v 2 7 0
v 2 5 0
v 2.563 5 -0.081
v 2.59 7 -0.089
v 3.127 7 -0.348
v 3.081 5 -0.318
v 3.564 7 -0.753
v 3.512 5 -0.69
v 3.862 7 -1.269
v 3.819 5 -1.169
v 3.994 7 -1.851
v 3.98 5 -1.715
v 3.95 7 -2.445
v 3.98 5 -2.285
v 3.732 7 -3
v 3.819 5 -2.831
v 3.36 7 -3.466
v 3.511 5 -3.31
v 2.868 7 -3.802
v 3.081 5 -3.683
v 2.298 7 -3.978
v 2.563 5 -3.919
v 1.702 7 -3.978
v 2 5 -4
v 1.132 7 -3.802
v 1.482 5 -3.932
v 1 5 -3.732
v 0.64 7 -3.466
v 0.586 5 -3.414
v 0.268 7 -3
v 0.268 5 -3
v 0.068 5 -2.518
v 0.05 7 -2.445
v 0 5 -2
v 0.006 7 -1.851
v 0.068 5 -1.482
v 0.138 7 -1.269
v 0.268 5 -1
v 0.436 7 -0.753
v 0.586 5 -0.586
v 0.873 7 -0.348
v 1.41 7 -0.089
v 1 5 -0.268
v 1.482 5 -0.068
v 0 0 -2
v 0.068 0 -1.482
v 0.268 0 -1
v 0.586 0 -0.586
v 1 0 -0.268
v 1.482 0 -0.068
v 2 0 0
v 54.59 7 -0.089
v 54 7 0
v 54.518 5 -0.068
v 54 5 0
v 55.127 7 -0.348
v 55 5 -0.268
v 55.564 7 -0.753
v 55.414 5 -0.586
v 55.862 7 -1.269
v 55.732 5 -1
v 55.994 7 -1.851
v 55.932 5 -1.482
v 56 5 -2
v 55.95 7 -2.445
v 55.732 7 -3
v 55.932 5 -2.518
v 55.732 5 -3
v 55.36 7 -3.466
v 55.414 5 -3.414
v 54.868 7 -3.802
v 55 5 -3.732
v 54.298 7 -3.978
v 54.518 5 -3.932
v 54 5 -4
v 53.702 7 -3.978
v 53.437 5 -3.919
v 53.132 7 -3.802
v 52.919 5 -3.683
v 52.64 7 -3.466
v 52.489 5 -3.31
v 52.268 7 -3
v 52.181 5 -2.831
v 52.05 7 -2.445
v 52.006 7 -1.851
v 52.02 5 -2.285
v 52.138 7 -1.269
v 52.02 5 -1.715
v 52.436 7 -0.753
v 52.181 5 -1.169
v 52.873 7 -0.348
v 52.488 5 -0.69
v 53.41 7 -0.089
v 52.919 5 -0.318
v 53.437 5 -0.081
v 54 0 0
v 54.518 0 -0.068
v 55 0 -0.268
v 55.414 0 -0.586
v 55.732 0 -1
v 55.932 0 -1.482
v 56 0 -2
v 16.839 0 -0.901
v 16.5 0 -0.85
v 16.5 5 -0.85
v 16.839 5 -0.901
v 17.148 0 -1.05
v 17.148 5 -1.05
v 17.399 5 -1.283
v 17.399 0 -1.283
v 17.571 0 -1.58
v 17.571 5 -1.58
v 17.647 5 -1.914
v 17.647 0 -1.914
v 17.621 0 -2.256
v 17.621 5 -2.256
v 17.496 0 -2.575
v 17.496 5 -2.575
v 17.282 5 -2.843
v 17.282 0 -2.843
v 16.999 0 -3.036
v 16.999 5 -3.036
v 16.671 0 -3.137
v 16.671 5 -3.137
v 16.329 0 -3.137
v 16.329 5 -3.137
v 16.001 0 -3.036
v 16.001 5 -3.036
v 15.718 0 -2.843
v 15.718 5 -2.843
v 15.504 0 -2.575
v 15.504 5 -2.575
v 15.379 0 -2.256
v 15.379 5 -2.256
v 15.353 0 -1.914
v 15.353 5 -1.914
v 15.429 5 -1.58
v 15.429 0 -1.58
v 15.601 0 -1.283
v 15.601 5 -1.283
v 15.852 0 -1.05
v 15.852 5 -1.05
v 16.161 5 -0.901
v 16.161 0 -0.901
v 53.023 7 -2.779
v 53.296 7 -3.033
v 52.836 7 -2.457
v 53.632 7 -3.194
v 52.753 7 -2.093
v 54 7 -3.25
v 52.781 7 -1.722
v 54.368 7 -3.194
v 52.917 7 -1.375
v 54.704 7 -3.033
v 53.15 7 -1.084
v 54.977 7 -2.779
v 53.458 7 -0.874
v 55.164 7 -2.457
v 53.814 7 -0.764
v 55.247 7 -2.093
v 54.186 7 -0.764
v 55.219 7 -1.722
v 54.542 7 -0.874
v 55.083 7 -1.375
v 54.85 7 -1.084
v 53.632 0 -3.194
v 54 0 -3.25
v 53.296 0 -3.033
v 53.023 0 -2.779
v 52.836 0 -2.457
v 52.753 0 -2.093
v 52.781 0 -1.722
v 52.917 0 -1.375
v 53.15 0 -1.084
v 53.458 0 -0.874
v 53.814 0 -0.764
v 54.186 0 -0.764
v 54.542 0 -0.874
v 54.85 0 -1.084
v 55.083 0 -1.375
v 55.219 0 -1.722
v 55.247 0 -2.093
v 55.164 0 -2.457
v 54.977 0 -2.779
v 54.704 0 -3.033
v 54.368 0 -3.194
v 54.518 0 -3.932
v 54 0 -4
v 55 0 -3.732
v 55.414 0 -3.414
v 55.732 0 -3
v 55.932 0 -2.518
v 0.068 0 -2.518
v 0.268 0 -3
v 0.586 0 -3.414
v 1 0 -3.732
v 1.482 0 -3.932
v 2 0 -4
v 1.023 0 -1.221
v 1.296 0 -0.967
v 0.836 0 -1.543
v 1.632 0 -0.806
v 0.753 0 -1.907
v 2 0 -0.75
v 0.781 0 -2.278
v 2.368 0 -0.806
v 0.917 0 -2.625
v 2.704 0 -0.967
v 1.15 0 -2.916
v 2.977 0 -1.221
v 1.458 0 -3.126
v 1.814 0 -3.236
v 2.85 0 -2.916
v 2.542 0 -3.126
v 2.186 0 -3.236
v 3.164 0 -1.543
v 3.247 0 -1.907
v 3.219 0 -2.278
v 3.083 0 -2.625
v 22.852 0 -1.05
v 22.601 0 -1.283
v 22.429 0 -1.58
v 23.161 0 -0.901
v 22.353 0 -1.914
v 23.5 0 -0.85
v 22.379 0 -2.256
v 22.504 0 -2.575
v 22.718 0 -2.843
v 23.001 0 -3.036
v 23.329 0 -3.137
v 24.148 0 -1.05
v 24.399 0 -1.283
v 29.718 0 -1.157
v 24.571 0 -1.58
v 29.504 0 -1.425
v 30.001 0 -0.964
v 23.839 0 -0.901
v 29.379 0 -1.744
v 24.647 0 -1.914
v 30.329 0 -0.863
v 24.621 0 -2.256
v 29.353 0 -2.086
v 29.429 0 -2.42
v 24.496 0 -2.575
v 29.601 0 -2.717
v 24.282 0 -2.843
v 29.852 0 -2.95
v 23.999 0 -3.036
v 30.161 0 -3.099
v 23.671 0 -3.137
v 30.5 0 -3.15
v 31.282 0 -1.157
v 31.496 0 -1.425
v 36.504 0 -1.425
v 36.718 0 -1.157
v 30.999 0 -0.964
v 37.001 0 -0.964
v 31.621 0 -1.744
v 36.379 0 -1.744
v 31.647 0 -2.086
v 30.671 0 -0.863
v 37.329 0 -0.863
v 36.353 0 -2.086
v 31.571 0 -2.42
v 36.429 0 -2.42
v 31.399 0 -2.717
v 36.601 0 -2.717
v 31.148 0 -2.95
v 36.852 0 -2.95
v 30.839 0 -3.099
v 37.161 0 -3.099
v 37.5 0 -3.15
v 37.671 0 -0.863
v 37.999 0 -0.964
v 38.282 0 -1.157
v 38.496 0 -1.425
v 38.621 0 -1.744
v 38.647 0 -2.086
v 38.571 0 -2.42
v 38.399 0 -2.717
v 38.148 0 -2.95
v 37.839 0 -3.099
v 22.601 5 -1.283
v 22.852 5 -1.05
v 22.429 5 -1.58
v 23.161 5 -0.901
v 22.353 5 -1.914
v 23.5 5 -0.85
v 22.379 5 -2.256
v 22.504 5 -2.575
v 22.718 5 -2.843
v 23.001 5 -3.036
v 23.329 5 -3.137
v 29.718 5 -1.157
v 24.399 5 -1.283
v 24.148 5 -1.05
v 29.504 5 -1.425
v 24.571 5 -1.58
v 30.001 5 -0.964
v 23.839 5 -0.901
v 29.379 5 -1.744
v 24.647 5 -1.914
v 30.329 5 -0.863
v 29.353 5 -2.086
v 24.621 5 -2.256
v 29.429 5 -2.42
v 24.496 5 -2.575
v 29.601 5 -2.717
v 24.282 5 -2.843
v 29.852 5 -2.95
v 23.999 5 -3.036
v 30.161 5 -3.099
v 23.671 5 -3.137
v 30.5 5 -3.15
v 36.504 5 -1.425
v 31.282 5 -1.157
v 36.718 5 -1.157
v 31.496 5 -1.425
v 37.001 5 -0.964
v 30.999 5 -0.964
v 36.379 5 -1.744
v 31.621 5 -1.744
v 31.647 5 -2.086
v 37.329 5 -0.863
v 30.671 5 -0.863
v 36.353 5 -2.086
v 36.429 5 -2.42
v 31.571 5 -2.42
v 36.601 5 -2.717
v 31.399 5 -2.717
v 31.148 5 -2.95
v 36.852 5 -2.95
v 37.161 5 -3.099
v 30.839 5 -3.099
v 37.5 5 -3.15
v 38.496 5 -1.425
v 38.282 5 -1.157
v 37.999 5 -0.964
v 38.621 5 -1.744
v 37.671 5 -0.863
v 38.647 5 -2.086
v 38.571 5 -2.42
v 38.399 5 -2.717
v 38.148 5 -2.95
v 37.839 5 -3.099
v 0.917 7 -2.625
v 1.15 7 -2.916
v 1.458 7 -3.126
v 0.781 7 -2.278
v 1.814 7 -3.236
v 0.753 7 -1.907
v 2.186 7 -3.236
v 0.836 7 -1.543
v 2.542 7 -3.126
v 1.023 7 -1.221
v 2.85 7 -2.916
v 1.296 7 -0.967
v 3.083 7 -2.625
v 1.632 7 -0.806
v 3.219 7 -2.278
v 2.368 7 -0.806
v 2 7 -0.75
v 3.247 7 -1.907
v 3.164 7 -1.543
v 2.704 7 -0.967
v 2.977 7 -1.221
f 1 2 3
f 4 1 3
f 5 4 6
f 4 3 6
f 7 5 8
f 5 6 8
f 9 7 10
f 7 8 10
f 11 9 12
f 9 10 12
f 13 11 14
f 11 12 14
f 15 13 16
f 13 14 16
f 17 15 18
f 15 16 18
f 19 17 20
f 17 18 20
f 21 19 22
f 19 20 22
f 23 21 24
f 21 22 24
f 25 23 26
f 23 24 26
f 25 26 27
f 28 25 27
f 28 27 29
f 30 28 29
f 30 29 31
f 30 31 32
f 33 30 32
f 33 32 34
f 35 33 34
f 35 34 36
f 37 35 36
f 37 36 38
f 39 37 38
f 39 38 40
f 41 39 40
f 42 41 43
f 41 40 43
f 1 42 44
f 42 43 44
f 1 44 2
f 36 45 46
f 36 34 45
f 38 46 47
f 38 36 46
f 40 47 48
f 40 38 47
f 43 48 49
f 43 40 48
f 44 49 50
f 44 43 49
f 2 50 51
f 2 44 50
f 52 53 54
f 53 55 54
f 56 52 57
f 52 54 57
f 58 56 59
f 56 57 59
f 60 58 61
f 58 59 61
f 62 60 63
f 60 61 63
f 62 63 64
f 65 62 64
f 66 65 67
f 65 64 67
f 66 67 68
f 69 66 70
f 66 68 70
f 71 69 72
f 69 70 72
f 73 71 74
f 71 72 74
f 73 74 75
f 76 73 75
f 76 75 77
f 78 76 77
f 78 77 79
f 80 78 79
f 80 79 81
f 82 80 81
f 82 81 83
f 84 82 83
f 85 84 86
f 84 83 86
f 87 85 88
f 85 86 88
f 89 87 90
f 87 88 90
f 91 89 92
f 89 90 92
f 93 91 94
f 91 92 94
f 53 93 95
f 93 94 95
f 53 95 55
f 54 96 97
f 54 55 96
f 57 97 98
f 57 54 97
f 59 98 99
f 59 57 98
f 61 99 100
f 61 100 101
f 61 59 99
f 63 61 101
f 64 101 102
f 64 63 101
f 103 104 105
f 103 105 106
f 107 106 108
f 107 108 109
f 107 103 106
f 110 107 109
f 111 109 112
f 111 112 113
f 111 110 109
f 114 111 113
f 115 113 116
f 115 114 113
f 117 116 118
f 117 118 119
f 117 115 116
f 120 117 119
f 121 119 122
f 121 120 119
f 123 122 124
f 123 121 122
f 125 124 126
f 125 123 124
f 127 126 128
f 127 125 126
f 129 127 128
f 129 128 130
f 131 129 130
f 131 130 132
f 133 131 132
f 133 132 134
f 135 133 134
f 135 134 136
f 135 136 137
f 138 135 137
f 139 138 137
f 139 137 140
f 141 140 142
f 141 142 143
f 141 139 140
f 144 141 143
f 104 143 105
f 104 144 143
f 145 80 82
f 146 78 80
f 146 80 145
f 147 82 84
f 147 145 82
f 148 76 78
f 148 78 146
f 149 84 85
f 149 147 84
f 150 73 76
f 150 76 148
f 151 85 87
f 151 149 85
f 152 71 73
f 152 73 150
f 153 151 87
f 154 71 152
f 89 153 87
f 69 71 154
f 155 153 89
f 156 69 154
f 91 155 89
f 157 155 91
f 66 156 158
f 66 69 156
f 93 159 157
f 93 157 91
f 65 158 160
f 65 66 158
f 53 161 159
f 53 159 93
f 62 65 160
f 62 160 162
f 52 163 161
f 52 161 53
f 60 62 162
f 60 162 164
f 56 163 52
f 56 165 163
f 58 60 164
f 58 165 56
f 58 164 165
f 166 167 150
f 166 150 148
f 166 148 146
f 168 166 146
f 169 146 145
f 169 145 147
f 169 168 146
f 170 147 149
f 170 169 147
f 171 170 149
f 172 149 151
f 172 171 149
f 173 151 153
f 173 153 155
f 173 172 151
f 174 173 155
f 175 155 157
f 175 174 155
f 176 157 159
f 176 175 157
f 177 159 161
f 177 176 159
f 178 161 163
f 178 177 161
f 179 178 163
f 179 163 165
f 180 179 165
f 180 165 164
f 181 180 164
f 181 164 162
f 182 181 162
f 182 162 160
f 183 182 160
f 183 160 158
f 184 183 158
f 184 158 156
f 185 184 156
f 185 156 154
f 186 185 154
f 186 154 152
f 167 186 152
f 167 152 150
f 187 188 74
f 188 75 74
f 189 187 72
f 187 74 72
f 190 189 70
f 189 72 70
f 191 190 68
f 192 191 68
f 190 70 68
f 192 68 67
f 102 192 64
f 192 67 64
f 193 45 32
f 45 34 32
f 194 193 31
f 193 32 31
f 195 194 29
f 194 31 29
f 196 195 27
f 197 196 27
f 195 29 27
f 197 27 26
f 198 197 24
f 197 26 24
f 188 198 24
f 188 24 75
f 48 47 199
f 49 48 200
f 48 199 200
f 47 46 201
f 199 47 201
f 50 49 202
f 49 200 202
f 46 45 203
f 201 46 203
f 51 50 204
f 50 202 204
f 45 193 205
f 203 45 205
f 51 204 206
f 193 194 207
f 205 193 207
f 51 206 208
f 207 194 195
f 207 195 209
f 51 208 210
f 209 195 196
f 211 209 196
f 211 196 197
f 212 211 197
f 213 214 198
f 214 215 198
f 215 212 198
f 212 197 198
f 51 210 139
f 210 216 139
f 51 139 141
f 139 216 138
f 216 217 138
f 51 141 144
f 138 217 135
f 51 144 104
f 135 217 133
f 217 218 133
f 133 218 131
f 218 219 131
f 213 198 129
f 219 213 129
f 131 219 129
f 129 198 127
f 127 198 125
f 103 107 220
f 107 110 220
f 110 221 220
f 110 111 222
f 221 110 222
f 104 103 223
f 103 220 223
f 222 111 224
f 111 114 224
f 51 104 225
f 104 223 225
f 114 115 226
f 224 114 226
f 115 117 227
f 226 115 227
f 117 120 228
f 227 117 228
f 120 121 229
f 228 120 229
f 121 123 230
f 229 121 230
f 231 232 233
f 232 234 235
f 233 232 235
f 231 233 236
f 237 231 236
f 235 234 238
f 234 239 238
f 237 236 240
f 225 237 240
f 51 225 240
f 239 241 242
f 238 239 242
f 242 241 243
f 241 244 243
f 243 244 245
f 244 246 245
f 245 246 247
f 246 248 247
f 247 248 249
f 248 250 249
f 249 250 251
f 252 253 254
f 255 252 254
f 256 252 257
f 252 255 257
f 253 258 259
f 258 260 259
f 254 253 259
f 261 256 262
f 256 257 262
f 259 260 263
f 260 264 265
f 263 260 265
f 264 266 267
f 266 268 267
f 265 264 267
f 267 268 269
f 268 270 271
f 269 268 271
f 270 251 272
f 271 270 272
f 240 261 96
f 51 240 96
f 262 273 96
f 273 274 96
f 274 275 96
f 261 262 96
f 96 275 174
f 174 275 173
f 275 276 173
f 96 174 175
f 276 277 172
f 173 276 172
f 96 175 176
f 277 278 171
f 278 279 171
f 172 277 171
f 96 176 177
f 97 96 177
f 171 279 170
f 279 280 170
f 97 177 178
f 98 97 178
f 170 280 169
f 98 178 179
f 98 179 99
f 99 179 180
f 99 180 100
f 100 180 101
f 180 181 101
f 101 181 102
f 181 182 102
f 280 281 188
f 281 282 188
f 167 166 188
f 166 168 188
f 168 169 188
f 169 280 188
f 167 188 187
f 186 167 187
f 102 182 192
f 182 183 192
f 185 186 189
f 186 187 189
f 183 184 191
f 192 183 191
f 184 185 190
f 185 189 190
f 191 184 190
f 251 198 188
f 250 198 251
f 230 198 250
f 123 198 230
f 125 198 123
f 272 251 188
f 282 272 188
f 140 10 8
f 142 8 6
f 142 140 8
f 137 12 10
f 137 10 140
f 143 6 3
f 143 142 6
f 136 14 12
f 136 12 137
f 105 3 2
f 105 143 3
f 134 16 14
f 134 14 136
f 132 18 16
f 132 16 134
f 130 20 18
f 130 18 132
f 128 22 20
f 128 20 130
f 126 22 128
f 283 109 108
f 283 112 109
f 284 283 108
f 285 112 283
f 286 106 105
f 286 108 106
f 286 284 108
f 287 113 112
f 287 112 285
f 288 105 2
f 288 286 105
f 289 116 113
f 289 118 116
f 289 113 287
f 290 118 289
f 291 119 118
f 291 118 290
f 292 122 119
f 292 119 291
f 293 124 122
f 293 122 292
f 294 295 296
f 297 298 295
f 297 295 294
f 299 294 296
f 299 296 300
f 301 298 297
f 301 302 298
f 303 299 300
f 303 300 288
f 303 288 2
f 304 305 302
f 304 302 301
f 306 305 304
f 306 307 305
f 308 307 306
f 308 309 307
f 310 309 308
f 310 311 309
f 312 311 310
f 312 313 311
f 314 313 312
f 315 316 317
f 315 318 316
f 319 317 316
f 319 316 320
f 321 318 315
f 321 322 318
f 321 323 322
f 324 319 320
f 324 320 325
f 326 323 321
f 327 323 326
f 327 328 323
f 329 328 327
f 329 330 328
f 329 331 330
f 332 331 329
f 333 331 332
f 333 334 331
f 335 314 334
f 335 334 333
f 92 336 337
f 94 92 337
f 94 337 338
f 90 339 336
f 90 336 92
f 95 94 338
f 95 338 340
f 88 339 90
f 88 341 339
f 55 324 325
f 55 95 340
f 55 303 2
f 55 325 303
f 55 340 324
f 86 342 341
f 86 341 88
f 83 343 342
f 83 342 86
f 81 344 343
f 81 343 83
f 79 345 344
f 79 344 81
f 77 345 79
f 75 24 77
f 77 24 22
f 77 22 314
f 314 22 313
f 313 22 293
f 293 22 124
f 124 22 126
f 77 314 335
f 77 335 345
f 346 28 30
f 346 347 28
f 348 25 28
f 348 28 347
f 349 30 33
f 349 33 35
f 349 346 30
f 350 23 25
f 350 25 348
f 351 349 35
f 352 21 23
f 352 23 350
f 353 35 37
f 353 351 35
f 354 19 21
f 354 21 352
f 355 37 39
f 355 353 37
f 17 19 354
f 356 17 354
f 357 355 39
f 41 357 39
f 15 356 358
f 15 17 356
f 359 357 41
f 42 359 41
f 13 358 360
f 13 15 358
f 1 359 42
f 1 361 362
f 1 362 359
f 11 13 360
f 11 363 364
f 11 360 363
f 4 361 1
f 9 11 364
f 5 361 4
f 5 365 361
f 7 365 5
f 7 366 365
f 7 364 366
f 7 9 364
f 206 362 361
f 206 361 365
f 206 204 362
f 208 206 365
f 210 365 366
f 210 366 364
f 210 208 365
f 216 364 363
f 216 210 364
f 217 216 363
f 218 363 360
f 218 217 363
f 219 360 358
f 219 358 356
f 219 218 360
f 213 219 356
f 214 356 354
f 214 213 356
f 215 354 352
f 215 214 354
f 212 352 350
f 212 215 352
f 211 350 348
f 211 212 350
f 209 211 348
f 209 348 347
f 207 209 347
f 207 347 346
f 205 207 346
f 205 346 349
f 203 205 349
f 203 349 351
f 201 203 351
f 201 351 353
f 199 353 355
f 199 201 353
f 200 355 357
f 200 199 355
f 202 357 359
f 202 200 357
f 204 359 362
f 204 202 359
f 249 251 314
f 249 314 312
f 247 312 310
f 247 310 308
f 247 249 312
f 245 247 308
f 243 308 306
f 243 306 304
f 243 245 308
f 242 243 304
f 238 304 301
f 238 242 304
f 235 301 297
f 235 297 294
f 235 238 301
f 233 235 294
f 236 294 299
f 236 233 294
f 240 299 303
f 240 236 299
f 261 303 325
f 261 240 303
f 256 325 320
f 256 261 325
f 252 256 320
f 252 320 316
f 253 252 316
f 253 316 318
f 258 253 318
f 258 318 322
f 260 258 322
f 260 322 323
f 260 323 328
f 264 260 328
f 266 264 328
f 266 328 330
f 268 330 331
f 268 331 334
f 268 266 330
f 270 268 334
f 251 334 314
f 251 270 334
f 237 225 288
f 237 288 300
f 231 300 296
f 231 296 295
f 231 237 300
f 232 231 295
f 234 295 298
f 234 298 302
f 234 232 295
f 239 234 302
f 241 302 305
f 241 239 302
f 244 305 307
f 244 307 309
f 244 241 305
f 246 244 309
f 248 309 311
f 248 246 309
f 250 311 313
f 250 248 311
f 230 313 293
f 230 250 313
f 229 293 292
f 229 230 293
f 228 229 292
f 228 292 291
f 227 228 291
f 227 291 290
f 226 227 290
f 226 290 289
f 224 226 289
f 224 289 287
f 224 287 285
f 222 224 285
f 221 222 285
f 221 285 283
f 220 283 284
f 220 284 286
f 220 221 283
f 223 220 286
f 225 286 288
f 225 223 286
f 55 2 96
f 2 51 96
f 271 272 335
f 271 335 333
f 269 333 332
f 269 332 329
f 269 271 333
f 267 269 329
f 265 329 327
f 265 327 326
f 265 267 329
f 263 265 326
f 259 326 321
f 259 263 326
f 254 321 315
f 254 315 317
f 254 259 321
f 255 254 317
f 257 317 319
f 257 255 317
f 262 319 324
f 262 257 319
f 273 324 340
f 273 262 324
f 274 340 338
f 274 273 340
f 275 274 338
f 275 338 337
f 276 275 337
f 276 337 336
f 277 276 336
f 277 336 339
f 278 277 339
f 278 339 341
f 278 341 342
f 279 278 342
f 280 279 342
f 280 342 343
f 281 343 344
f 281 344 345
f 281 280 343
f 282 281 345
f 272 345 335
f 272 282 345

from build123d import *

# Parameters (mm, degrees)
SKETCH1_W           = 56
SKETCH1_H           = 4
SKETCH1_R           = 1.25
SKETCH1_R_2         = 1.15
BOSS_EXTRUDE1_DEPTH = 5
FILLET1_R           = 2
SKETCH2_R           = 2
SKETCH2_R_2         = 1.25
BOSS_EXTRUDE2_DEPTH = 2


with BuildPart() as part:
    # Sketch1 → Boss-Extrude1 (new body)
    with BuildSketch(Plane(origin=(0, 0, 0), x_dir=(1, 0, 0), z_dir=(0, 1, 0))):
        with Locations((28, 2)):
            Rectangle(SKETCH1_W, SKETCH1_H)
        with Locations(Location((2, 2, 0), (0, 0, 270))):
            Circle(SKETCH1_R, mode=Mode.SUBTRACT)
        with Locations(Location((16.5, 2, 0), (0, 0, 270))):
            Circle(SKETCH1_R_2, mode=Mode.SUBTRACT)
        with Locations(Location((23.5, 2, 0), (0, 0, 270))):
            Circle(SKETCH1_R_2, mode=Mode.SUBTRACT)
        with Locations(Location((54, 2, 0), (0, 0, 90))):
            Circle(SKETCH1_R, mode=Mode.SUBTRACT)
        with Locations(Location((30.5, 2, 0), (0, 0, 90))):
            Circle(SKETCH1_R_2, mode=Mode.SUBTRACT)
        with Locations(Location((37.5, 2, 0), (0, 0, 90))):
            Circle(SKETCH1_R_2, mode=Mode.SUBTRACT)
    extrude(amount=BOSS_EXTRUDE1_DEPTH)

    # Fillet1
    fillet1_edges = [part.edges().sort_by_distance(p)[0] for p in [
        (56, 2.5, -4),
        (56, 2.5, 0),
        (0, 2.5, -4),
        (0, 2.5, 0),
    ]]
    fillet(fillet1_edges, radius=FILLET1_R - 0.0001)  # a hair under: the kernel refuses the full size

    # Sketch2 → Boss-Extrude2 (add)
    # profile 1 of 2: a face of its own
    with BuildSketch(Plane(origin=(0, 5, 0), x_dir=(1, 0, 0), z_dir=(0, 1, 0))):
        with Locations(Location((2, 2, 0), (0, 0, 270))):
            Circle(SKETCH2_R)
        with Locations(Location((2, 2, 0), (0, 0, 270))):
            Circle(SKETCH2_R_2, mode=Mode.SUBTRACT)
    # profile 2 of 2: a face of its own
    with BuildSketch(Plane(origin=(0, 5, 0), x_dir=(1, 0, 0), z_dir=(0, 1, 0))):
        with Locations(Location((54, 2, 0), (0, 0, 270))):
            Circle(SKETCH2_R)
        with Locations(Location((54, 2, 0), (0, 0, 90))):
            Circle(SKETCH2_R_2, mode=Mode.SUBTRACT)
    extrude(amount=BOSS_EXTRUDE2_DEPTH)


solid = part.part
